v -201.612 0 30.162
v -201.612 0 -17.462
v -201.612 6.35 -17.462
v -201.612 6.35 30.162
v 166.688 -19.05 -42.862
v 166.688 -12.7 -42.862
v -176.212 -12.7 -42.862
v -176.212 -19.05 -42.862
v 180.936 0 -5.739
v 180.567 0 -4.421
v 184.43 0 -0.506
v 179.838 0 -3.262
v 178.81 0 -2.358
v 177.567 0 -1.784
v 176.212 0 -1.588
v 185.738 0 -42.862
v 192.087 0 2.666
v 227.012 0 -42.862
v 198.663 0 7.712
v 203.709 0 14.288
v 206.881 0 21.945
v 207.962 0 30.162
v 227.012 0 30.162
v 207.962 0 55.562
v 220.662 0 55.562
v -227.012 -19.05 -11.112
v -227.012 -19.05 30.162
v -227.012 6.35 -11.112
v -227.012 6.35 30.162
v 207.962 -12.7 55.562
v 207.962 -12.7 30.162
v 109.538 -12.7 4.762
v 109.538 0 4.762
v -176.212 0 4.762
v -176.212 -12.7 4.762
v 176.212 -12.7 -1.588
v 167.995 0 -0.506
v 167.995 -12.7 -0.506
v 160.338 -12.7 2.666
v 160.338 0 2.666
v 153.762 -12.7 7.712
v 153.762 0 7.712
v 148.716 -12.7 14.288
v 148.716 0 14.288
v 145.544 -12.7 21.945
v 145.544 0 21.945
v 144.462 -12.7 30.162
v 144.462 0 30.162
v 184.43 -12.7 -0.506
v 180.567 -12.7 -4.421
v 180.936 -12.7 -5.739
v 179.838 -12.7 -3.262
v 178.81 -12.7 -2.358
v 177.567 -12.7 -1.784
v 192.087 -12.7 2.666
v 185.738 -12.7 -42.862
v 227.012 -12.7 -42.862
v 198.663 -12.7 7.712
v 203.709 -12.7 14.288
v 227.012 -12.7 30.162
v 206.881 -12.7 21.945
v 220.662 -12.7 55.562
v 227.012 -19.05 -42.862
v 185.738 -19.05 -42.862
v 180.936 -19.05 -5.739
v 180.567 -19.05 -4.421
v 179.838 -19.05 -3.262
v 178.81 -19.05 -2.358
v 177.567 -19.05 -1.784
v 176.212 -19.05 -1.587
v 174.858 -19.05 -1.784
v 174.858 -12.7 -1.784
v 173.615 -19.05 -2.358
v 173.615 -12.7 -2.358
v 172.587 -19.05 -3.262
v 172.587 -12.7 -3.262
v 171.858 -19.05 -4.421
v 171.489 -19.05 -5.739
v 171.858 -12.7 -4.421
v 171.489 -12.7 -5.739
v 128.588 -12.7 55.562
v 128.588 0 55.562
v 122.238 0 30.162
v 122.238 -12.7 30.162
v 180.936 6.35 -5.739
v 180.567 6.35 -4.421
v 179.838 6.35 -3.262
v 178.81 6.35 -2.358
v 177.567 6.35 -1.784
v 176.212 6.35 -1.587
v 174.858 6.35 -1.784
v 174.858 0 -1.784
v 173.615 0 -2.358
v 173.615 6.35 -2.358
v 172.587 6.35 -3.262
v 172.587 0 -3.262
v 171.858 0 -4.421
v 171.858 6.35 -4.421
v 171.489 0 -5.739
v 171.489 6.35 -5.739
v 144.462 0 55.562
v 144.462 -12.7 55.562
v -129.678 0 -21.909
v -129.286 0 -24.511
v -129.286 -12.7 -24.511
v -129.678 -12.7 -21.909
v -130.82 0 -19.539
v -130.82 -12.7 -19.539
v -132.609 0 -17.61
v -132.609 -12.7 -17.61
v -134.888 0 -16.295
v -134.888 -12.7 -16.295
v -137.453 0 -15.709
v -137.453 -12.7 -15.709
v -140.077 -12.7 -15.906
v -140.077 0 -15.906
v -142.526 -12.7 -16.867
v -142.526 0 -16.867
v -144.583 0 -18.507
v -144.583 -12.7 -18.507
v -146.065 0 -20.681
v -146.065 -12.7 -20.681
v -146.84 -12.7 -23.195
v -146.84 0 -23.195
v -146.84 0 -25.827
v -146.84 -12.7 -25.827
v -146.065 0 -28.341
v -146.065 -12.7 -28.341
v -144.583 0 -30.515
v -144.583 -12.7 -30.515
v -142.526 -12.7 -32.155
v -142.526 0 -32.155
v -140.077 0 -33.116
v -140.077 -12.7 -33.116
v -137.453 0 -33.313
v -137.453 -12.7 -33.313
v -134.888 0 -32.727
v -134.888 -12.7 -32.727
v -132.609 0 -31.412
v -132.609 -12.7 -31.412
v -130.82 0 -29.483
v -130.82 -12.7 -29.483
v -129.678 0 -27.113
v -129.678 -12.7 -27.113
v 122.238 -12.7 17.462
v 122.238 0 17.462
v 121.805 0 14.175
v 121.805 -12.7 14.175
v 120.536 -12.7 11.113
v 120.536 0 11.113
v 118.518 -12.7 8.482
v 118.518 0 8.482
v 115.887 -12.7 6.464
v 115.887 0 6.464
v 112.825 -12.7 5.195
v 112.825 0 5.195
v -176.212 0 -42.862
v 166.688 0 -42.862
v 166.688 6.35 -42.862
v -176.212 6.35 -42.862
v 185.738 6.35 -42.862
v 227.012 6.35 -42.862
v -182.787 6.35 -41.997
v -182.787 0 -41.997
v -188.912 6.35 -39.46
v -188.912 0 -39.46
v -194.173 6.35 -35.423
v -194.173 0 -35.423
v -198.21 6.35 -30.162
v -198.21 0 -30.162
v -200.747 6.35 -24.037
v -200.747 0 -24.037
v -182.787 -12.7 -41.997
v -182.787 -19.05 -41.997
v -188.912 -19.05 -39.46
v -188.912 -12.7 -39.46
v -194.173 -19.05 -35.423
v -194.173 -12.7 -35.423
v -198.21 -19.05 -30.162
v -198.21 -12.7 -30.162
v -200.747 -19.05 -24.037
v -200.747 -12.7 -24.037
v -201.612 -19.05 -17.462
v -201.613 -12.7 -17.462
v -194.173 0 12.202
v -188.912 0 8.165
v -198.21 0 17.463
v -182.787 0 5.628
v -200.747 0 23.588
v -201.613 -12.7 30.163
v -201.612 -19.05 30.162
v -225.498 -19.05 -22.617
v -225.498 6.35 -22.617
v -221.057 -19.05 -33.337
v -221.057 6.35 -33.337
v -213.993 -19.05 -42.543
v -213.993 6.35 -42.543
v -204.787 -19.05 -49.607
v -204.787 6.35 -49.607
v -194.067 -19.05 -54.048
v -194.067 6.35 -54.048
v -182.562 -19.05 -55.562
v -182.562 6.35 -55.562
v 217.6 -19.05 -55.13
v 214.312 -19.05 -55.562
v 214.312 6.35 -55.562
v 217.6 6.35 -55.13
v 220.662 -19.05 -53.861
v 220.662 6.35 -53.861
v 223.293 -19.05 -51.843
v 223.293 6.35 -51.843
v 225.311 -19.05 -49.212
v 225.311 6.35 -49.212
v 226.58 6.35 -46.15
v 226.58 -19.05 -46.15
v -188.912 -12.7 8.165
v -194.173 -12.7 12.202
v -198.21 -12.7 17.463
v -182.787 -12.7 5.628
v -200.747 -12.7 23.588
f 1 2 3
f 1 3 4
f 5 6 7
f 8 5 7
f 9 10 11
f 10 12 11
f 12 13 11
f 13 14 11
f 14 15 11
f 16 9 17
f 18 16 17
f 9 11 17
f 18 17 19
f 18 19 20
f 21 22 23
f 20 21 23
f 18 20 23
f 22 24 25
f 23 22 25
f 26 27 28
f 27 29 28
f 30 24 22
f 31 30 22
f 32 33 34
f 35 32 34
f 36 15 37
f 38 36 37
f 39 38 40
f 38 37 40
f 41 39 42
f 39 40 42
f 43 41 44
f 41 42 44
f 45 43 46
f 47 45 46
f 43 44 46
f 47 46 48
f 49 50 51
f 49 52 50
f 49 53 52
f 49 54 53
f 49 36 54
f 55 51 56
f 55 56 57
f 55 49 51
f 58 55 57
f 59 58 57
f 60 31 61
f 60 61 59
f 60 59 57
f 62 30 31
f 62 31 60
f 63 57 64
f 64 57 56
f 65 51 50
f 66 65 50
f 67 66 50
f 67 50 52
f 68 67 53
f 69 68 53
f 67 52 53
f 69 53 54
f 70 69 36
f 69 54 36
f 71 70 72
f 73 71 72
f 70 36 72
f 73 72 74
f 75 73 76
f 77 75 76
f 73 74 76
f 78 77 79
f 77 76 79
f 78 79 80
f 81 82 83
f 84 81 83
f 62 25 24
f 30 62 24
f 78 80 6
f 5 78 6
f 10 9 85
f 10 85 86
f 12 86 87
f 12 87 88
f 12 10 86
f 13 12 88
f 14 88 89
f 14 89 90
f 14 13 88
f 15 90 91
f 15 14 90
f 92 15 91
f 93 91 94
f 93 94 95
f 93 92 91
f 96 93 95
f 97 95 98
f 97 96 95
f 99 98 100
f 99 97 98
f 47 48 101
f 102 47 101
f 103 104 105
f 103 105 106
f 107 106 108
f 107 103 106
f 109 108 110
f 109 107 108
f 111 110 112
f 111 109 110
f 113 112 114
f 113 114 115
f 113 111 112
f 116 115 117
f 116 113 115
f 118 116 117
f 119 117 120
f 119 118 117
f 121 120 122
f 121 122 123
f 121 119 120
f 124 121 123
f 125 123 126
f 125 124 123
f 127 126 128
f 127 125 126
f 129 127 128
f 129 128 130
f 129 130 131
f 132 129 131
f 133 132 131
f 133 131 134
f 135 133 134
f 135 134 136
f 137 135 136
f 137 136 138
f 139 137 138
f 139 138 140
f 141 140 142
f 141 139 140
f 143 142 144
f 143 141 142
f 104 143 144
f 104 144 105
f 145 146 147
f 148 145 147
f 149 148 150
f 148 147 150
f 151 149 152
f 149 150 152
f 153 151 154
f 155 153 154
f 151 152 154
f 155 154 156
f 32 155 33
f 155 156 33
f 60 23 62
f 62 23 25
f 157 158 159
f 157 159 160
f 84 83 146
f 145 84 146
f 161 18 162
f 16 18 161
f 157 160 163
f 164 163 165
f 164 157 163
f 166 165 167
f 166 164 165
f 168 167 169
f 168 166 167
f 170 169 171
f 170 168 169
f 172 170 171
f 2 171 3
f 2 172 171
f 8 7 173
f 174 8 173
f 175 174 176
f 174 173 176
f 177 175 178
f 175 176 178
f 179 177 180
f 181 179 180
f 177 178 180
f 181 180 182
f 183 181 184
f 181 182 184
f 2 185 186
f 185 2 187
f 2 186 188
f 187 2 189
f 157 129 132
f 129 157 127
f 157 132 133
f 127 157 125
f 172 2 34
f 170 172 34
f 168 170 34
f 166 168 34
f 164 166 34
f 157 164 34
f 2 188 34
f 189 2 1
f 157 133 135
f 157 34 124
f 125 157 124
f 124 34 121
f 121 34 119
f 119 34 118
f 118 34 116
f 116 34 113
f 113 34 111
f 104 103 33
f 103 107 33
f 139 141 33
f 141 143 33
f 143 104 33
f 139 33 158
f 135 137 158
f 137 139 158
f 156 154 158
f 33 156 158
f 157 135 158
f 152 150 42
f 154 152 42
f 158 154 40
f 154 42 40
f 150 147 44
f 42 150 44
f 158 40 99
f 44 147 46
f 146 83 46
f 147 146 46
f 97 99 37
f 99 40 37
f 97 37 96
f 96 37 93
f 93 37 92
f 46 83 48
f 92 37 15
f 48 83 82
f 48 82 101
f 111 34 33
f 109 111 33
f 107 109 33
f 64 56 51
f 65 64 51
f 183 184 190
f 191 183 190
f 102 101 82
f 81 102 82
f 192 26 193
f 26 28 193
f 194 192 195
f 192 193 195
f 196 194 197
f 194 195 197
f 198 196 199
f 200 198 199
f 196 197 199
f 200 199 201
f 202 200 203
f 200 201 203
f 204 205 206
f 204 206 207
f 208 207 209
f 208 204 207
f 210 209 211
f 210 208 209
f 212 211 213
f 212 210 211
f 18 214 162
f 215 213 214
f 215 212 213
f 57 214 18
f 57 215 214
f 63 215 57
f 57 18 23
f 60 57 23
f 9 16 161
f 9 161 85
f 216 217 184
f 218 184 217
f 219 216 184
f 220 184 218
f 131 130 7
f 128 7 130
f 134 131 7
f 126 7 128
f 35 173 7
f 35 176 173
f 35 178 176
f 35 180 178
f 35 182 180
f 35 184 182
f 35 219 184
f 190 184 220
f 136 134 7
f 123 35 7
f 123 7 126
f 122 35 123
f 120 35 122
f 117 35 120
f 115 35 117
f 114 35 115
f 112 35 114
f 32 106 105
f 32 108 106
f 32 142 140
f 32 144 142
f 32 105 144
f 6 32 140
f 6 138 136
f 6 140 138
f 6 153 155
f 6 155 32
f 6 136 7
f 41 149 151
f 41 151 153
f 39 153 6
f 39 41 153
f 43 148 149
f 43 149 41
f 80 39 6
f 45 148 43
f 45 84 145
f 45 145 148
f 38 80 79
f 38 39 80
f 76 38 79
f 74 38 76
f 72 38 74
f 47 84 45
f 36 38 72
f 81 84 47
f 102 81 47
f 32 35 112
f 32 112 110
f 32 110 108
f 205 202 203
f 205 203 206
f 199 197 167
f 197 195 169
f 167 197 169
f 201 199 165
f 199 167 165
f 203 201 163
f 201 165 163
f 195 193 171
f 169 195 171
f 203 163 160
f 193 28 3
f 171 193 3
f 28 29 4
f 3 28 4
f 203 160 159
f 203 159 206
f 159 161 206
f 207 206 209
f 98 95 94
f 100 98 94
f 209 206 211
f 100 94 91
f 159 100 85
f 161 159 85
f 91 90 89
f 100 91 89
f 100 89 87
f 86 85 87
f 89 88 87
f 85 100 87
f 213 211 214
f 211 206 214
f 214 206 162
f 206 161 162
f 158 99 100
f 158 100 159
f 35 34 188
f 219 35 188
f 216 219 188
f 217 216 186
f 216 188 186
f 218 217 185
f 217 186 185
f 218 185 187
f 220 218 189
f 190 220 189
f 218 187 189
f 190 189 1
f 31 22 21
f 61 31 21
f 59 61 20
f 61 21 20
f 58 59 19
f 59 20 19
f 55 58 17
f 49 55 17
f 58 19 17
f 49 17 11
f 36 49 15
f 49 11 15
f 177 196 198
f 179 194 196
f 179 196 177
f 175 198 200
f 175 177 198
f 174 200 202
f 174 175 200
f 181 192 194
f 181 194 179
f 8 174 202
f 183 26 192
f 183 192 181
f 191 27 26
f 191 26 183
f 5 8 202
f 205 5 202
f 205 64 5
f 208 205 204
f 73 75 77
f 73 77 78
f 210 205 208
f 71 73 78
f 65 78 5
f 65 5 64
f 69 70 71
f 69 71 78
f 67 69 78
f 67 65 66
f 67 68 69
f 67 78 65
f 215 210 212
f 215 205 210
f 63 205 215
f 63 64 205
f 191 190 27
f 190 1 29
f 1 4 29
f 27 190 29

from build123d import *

# Parameters (mm, degrees)
F0_R          = 8.8265
F1_DEPTH      = 12.7
F3_DEPTH      = 6.35
F3_DEPTH_BACK = 19.05


with BuildPart() as f1:
    # F0 (on Front) → F1 (new body)
    with BuildSketch(Plane.XZ):
        with BuildLine():
            Line((227.0125, 30.1625), (220.6625, 55.5625))
            Line((220.6625, 55.5625), (207.9625, 55.5625))
            Line((207.9625, 55.5625), (207.9625, 30.1625))
            ThreePointArc((207.9625, 30.1625), (198.66314, 7.71186), (176.2125, -1.5875))
            ThreePointArc((176.2125, -1.5875), (153.76186, 7.71186), (144.4625, 30.1625))
            Line((144.4625, 30.1625), (144.4625, 55.5625))
            Line((144.4625, 55.5625), (128.5875, 55.5625))
            Line((128.5875, 55.5625), (122.2375, 30.1625))
            Line((122.2375, 30.1625), (122.2375, 17.4625))
            ThreePointArc((122.2375, 17.4625), (118.517756, 8.482244), (109.5375, 4.7625))
            Line((109.5375, 4.7625), (-176.2125, 4.7625))
            ThreePointArc((-176.2125, 4.7625), (-194.173012, 12.201988), (-201.6125, 30.1625))
            Line((-201.6125, 30.1625), (-227.0125, 30.1625))
            Line((-227.0125, 30.1625), (-227.0125, -11.1125))
            ThreePointArc((-227.0125, -11.1125), (-213.993396, -42.543396), (-182.5625, -55.5625))
            Line((-182.5625, -55.5625), (214.3125, -55.5625))
            ThreePointArc((214.3125, -55.5625), (223.292756, -51.842756), (227.0125, -42.8625))
            Line((227.0125, -42.8625), (227.0125, 30.1625))
        make_face()
        with Locations((-138.1125, -24.511)):
            Circle(F0_R, mode=Mode.SUBTRACT)
    extrude(amount=F1_DEPTH)

    # F2 (on face) → F3 (join, two sides)
    with BuildSketch(Plane.XZ.offset(12.7)) as f3_sk:
        with BuildLine():
            Line((-201.6125, -17.4625), (-201.6125, 30.1625))
            Line((-201.6125, 30.1625), (-227.0125, 30.1625))
            Line((-227.0125, 30.1625), (-227.0125, -11.1125))
            ThreePointArc((-227.0125, -11.1125), (-213.993396, -42.543396), (-182.5625, -55.5625))
            Line((-182.5625, -55.5625), (214.3125, -55.5625))
            ThreePointArc((214.3125, -55.5625), (223.292756, -51.842756), (227.0125, -42.8625))
            Line((227.0125, -42.8625), (185.7375, -42.8625))
            Line((185.7375, -42.8625), (180.935652, -5.739069))
            ThreePointArc((180.935652, -5.739069), (176.2125, -1.5875), (171.489348, -5.739069))
            Line((171.489348, -5.739069), (166.6875, -42.8625))
            Line((166.6875, -42.8625), (-176.2125, -42.8625))
            ThreePointArc((-176.2125, -42.8625), (-194.173012, -35.423012), (-201.6125, -17.4625))
        make_face()
    extrude(amount=F3_DEPTH)
    extrude(f3_sk.sketch, amount=-F3_DEPTH_BACK)


solid = f1.part
